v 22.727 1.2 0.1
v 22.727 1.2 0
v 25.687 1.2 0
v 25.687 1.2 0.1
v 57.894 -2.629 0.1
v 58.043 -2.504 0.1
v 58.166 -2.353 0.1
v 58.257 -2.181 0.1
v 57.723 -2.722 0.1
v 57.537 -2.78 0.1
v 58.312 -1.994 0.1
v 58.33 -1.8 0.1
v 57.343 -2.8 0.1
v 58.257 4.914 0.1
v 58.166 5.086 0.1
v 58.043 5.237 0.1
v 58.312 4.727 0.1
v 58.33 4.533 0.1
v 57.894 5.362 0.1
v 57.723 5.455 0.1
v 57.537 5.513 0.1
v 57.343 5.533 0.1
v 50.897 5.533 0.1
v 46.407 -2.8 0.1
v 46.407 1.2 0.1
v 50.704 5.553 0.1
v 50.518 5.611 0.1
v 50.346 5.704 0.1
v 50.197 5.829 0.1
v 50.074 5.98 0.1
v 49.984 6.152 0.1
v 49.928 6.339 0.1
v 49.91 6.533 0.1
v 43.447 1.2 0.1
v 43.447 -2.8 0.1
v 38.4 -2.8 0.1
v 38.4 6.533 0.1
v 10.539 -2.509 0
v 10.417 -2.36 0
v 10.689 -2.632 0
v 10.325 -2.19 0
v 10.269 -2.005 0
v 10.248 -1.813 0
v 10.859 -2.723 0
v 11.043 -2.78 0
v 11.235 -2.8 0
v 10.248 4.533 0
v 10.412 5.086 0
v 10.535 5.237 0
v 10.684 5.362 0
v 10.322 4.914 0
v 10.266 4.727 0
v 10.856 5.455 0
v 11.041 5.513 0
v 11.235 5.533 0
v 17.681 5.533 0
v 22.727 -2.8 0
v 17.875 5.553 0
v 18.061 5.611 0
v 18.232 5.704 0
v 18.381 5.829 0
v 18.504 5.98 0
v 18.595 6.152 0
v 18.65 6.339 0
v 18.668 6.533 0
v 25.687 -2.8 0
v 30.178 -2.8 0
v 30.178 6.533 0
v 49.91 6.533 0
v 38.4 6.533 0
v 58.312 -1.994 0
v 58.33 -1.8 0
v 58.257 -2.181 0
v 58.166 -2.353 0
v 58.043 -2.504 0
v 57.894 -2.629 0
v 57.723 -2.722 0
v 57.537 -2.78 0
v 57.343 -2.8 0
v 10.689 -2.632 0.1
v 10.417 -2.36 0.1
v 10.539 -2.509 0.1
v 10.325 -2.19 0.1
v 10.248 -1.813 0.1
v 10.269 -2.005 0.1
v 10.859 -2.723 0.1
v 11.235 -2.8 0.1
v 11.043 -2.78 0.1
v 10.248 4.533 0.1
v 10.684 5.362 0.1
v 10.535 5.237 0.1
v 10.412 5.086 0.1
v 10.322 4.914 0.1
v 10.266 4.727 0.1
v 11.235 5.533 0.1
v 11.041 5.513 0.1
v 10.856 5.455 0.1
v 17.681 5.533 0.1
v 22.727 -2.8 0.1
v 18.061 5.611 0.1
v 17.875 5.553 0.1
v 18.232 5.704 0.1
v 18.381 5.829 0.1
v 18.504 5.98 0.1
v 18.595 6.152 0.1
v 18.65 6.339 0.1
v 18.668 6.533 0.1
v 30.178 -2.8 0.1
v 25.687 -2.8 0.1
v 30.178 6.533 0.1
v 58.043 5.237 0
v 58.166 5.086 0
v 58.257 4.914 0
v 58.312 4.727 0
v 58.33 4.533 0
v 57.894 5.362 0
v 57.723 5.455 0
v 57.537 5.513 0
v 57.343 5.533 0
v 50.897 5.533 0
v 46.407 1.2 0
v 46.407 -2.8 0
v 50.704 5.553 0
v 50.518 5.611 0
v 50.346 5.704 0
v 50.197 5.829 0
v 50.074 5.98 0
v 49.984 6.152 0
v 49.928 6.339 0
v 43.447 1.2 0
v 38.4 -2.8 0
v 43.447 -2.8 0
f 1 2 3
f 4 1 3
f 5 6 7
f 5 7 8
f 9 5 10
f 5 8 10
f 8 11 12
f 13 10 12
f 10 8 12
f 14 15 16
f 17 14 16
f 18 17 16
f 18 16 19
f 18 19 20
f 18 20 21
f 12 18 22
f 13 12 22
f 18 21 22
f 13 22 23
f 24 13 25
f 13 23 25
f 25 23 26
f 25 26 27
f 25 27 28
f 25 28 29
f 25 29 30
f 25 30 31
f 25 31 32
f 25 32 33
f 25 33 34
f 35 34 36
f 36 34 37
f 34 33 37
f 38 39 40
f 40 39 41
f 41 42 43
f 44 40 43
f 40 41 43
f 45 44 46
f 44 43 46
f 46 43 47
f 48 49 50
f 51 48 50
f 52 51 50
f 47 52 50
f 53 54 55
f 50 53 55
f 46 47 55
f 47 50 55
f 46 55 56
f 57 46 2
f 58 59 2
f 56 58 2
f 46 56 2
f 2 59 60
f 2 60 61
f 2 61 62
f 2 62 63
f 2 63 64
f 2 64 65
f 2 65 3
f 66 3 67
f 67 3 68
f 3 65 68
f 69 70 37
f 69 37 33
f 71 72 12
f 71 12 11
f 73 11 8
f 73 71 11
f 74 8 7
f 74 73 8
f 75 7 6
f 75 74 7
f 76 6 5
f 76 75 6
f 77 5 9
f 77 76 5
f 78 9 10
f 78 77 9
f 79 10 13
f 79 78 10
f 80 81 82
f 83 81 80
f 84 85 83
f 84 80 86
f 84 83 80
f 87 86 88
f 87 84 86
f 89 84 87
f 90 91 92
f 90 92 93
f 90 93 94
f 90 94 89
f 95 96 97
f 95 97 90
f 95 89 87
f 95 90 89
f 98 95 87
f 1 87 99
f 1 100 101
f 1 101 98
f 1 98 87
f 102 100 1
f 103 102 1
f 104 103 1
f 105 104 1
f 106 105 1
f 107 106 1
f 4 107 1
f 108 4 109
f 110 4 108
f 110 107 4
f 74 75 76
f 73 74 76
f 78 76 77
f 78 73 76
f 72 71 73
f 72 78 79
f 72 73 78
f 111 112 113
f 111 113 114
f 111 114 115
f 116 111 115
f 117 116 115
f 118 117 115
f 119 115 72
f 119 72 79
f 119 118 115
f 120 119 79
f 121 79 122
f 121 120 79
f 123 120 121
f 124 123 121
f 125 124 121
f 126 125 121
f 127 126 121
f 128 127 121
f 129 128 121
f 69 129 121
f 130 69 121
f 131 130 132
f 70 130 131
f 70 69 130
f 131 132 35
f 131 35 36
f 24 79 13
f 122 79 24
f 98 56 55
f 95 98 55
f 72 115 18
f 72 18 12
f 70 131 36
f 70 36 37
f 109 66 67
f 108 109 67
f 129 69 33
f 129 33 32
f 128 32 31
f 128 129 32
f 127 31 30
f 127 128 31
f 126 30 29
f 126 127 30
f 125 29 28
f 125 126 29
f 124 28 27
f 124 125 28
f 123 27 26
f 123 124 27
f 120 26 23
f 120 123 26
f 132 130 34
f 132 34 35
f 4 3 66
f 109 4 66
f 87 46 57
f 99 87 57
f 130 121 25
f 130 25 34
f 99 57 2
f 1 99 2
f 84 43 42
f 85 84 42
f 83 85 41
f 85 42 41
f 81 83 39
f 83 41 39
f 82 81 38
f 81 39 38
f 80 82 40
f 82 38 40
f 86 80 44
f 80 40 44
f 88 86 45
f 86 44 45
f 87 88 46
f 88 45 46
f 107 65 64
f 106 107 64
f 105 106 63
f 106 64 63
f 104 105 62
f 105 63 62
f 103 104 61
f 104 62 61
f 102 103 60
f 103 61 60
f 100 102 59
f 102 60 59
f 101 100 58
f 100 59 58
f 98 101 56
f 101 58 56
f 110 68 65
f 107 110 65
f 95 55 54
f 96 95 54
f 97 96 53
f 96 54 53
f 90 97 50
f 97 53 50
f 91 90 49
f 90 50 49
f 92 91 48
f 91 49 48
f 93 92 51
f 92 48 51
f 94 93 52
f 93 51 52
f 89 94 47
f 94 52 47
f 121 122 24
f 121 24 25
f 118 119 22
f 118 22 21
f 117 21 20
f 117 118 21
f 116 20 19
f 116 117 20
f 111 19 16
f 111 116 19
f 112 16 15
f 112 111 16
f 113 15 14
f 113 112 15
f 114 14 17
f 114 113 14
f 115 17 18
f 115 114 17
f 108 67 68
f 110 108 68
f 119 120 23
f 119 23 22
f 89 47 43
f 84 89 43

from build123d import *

# Parameters (mm, degrees)
SALIENTE_EXTRUIR1_DEPTH   = 0.1
SALIENTE_EXTRUIR1_2_DEPTH = 0.1


with BuildPart() as part:
    # Model → Saliente-Extruir1 (new body)
    with BuildSketch(Plane.XY):
        with BuildLine():
            Line((11.235138299, -2.8), (22.726845388, -2.8))
            Line((22.726845388, -2.8), (22.726845388, 1.2))
            Line((22.726845388, 1.2), (25.686845388, 1.2))
            Line((25.686845388, 1.2), (25.686845388, -2.8))
            Line((25.686845388, -2.8), (30.178151632, -2.8))
            Line((30.178151632, -2.8), (30.178151632, 6.533))
            Line((30.178151632, 6.533), (18.667698299, 6.533))
            ThreePointArc((18.667698299, 6.533), (18.381471747, 5.828654643), (17.681031632, 5.533))
            Line((17.681031632, 5.533), (11.235138299, 5.533))
            ThreePointArc((11.235138299, 5.533), (10.534698184, 5.237345357), (10.248471632, 4.533))
            Line((10.248471632, 4.533), (10.248471632, -1.8))
            Line((10.248471632, -1.8), (10.248471632, -1.813333333))
            ThreePointArc((10.248471632, -1.813333333), (10.539396411, -2.509075221), (11.235138299, -2.8))
        make_face()
    extrude(amount=SALIENTE_EXTRUIR1_DEPTH)


with BuildPart() as body_2:
    # Model → Saliente-Extruir1 2 (new body)
    with BuildSketch(Plane.XY):
        with BuildLine():
            Line((57.343058299, -2.8), (46.406845388, -2.8))
            Line((46.406845388, -2.8), (46.406845388, 1.2))
            Line((46.406845388, 1.2), (43.446845388, 1.2))
            Line((43.446845388, 1.2), (43.446845388, -2.8))
            Line((43.446845388, -2.8), (38.400044966, -2.8))
            Line((38.400044966, -2.8), (38.400044966, 6.533))
            Line((38.400044966, 6.533), (49.910498299, 6.533))
            ThreePointArc((49.910498299, 6.533), (50.196724851, 5.828654643), (50.897164966, 5.533))
            Line((50.897164966, 5.533), (57.343058299, 5.533))
            ThreePointArc((57.343058299, 5.533), (58.043498413, 5.237345357), (58.329724966, 4.533))
            Line((58.329724966, 4.533), (58.329724966, -1.8))
            ThreePointArc((58.329724966, -1.8), (58.043498413, -2.504345357), (57.343058299, -2.8))
        make_face()
    extrude(amount=SALIENTE_EXTRUIR1_2_DEPTH)


solid = Compound([part.part, body_2.part])
